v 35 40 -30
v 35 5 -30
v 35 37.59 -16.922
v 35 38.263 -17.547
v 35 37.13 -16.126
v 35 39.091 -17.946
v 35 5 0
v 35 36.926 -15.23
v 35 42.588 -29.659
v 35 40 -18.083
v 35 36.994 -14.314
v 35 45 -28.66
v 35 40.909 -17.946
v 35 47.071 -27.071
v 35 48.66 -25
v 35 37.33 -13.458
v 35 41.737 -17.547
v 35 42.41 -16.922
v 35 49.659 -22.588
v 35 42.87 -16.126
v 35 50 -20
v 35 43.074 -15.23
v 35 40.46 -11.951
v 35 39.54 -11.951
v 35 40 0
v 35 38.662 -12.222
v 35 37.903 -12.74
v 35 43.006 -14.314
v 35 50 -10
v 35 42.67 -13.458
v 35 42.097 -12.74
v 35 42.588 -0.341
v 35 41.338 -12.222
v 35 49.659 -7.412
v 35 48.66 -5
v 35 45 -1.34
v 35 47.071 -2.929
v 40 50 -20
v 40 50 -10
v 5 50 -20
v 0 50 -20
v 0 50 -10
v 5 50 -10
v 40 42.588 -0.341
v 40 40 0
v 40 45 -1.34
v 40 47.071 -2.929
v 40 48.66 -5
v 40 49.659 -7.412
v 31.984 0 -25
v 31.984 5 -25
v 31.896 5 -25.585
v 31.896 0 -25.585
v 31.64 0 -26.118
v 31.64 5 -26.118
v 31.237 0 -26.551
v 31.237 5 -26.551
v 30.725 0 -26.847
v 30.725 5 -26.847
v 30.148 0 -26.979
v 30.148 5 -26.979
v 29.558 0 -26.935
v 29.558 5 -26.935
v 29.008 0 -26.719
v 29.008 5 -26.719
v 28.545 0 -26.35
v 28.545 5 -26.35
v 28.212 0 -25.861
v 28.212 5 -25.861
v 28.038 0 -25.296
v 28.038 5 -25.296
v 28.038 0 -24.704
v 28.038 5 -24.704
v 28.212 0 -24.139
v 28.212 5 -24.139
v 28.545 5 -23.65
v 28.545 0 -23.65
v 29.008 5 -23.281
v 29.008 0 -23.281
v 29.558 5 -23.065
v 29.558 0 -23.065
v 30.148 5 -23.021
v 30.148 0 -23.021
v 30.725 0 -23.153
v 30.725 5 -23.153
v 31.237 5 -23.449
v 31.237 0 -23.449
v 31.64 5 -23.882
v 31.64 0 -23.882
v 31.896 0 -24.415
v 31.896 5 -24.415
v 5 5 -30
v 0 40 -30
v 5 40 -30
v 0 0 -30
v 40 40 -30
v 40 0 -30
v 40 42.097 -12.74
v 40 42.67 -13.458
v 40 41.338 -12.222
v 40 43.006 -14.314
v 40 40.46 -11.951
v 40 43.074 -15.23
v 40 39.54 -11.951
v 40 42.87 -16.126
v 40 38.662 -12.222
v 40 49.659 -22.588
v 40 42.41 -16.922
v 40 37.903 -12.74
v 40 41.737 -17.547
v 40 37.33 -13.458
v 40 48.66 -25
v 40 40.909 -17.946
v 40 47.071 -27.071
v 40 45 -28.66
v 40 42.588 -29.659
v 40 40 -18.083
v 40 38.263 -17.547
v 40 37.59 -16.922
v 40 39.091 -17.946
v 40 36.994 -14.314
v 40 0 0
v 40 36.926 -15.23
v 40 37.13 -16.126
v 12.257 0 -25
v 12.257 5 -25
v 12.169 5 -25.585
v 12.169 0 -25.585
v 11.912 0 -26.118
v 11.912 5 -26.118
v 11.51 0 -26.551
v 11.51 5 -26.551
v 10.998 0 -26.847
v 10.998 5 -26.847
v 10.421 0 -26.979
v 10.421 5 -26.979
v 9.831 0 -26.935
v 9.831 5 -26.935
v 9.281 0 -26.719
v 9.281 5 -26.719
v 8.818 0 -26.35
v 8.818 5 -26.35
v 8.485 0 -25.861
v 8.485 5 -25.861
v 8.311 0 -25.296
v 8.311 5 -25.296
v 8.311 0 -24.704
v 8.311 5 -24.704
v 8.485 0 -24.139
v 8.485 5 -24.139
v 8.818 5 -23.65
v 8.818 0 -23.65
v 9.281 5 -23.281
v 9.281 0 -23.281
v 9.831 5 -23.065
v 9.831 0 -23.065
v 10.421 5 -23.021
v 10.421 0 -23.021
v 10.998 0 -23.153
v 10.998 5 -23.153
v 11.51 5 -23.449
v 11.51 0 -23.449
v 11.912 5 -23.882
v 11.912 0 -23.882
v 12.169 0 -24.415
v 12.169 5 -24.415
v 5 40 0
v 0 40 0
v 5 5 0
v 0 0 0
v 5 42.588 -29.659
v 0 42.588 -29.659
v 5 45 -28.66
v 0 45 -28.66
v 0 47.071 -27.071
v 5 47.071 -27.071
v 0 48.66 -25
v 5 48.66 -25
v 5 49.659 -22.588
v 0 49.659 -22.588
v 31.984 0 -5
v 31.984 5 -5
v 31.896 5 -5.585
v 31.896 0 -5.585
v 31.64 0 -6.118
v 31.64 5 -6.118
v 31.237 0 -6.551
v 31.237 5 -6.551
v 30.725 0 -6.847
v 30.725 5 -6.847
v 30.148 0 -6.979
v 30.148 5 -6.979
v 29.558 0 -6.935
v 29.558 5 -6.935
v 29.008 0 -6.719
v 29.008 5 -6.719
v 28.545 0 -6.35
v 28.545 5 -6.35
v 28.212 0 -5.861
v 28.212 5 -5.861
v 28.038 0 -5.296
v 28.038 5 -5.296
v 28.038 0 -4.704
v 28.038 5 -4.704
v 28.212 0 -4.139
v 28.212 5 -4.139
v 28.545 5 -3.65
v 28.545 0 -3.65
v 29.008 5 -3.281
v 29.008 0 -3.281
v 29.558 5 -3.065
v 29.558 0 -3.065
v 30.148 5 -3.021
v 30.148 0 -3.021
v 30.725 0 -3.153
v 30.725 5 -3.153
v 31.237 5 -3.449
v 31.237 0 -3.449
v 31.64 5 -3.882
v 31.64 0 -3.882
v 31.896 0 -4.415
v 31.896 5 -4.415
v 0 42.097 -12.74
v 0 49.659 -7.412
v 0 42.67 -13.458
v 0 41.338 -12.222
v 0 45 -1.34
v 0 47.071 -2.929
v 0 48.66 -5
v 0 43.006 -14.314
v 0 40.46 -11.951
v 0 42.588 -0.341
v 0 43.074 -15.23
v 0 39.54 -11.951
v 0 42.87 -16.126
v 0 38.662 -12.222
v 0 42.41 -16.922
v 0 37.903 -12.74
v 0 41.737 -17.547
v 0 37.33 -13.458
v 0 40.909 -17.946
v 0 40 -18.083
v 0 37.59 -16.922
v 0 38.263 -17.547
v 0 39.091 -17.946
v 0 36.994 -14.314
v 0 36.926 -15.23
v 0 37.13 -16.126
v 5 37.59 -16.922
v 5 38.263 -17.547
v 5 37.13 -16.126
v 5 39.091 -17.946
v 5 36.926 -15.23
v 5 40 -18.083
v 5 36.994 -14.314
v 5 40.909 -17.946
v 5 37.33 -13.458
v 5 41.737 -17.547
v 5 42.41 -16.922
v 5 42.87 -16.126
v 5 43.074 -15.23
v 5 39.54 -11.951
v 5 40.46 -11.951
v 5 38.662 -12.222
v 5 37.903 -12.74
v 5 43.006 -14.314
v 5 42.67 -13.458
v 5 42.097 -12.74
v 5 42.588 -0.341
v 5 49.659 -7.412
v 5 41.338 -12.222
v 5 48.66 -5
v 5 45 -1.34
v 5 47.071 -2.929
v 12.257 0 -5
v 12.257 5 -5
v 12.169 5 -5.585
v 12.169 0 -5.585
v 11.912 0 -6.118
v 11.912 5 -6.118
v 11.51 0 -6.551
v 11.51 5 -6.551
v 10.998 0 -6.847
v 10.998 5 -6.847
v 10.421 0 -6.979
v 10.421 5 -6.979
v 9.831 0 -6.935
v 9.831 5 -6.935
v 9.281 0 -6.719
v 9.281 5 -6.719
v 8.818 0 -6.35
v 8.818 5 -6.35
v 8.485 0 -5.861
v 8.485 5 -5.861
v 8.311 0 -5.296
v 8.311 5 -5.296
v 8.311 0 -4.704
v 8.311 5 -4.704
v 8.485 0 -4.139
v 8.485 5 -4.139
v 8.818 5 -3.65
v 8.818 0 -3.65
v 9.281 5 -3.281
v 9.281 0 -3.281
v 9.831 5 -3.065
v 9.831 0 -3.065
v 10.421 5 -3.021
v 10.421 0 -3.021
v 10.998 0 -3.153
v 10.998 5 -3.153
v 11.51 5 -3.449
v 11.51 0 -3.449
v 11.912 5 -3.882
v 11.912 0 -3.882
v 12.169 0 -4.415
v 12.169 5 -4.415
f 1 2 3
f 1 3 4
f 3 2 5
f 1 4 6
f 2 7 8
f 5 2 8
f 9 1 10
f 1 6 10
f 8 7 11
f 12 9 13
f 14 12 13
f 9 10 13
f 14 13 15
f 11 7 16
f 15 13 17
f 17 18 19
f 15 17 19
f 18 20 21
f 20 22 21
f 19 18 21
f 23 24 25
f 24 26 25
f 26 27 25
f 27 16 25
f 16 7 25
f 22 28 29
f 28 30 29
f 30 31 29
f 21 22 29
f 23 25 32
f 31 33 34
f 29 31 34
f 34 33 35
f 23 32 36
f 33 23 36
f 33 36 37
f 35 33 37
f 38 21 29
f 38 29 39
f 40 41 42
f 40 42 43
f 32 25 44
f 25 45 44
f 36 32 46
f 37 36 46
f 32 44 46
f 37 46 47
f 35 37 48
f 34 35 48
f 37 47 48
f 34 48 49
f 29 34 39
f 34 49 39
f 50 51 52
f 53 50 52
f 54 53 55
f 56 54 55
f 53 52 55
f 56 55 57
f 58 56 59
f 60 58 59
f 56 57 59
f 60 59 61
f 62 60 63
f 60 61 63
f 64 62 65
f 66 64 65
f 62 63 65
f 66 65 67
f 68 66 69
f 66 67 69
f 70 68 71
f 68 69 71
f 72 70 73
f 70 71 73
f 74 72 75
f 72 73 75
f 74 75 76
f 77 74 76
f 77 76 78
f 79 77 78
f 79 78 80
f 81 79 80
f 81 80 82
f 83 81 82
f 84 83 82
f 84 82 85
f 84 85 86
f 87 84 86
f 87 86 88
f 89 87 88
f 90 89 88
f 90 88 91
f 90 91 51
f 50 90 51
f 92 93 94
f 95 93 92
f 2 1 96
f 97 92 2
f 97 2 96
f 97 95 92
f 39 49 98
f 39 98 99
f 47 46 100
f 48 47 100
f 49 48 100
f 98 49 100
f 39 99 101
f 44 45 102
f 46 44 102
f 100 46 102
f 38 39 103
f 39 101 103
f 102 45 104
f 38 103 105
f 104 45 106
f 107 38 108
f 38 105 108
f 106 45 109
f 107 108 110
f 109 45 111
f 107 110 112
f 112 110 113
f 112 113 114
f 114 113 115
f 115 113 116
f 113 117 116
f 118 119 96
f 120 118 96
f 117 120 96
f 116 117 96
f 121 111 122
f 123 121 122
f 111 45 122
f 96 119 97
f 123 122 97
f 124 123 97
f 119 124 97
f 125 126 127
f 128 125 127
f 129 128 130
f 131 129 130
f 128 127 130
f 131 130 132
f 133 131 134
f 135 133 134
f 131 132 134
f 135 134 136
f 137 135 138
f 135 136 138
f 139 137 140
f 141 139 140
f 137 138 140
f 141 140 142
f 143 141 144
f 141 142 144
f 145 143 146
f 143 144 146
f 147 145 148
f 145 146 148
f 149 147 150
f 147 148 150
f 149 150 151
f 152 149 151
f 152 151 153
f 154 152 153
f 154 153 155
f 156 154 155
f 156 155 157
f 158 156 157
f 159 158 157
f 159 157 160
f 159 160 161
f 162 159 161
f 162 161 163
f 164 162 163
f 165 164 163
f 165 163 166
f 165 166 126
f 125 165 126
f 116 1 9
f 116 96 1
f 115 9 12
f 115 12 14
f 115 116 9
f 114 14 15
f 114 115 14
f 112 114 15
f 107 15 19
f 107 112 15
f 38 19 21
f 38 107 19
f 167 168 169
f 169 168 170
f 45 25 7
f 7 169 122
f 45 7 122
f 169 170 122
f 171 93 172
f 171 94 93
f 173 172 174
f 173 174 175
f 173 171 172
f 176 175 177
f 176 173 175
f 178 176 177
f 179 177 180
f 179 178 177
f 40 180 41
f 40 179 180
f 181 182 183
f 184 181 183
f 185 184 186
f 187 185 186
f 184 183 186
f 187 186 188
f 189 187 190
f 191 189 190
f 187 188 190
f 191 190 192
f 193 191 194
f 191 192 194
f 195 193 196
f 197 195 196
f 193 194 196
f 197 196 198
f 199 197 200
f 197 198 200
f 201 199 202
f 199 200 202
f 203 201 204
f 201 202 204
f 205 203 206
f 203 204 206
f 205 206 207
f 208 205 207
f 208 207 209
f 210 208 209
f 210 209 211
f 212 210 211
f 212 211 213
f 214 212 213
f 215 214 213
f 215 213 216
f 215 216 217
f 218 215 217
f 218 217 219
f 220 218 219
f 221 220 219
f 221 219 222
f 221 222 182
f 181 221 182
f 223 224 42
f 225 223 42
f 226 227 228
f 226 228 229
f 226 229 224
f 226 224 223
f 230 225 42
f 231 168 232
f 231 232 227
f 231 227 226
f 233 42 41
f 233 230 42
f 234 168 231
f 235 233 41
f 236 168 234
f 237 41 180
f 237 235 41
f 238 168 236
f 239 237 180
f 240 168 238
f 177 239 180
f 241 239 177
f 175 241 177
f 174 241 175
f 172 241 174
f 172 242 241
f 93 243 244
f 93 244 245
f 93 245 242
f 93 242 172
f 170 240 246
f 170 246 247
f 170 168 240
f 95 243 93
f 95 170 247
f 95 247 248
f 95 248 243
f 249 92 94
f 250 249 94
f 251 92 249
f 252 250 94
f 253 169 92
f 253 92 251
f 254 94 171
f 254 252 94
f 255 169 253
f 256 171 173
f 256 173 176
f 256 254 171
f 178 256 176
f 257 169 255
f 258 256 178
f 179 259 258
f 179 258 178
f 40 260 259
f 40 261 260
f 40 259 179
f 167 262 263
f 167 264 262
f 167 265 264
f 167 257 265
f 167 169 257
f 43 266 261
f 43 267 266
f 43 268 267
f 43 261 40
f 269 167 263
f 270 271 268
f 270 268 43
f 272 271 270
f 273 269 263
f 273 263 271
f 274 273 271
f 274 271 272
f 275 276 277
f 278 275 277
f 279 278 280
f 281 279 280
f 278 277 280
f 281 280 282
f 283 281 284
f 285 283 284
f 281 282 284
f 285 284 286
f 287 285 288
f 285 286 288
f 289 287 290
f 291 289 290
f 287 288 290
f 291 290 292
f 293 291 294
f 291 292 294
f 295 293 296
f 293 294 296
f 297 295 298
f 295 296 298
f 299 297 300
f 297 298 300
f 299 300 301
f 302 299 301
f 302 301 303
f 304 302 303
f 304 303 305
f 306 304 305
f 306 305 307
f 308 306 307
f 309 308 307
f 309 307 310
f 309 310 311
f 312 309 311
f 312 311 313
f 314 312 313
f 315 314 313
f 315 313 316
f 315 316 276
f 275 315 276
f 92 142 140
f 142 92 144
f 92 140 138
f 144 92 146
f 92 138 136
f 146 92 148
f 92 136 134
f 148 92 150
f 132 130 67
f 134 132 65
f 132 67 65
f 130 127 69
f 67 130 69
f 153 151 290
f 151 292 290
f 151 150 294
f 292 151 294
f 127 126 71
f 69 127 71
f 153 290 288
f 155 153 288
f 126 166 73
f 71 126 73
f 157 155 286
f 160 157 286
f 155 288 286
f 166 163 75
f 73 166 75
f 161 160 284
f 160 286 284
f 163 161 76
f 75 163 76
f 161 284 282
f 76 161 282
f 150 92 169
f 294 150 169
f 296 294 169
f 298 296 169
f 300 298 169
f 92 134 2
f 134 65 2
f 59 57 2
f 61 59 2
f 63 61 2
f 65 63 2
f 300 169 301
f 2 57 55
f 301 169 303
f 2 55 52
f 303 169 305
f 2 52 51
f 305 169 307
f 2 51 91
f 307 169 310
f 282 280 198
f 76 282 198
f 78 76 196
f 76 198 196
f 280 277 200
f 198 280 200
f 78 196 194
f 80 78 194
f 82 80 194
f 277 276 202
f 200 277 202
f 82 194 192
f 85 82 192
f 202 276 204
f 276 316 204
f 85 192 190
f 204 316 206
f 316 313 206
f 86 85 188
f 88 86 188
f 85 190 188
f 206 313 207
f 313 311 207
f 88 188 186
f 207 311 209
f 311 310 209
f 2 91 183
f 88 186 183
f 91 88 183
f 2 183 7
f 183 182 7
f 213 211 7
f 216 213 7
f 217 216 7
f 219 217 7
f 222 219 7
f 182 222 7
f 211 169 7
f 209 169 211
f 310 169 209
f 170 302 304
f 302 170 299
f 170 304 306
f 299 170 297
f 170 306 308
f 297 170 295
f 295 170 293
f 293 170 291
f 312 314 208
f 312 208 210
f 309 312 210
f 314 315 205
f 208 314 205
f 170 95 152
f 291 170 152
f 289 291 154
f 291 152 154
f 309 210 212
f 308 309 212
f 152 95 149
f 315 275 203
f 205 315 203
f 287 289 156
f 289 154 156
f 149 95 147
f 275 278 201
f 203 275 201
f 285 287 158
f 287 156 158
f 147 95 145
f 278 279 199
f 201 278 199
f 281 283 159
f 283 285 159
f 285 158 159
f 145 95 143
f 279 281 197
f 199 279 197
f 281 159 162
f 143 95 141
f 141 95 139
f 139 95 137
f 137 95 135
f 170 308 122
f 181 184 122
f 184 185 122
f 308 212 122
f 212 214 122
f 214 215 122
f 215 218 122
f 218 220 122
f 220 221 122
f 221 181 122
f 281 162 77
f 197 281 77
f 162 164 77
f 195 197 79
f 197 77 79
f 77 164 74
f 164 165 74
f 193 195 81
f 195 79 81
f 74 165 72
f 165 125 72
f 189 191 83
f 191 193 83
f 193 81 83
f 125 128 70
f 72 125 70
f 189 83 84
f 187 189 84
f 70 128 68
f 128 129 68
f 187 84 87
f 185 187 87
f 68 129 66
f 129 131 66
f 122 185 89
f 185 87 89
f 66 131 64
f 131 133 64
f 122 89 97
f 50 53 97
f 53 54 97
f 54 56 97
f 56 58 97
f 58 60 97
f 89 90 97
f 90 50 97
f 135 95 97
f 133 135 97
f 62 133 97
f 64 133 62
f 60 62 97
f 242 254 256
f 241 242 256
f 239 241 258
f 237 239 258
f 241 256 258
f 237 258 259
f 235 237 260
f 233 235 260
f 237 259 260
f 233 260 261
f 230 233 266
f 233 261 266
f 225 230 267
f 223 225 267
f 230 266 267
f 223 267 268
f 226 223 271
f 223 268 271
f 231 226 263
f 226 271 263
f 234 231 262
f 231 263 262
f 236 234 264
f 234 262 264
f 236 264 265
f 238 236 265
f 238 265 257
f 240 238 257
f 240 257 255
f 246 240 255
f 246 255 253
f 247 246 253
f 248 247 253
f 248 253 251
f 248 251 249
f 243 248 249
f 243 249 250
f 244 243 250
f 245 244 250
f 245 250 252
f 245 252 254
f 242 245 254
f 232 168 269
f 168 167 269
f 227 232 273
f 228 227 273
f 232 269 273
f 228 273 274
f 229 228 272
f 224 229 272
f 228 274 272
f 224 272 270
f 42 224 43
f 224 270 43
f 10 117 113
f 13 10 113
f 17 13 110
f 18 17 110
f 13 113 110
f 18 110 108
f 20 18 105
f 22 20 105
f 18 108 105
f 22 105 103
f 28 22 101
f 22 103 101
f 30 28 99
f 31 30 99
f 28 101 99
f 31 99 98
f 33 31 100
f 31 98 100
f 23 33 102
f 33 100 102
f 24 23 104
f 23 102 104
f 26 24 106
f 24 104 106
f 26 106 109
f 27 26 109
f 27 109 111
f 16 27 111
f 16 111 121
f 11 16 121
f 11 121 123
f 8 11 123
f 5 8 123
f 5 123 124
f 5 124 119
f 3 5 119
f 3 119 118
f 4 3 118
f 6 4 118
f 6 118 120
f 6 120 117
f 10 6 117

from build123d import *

# Parameters (mm, degrees)
SKETCH1_W           = 40
SKETCH1_H           = 30
BOSS_EXTRUDE1_DEPTH = 50
SKETCH2_W           = 30
SKETCH2_H           = 45
CUT_EXTRUDE1_DEPTH  = 30
FILLET1_R           = 10
SKETCH3_R           = 1.984375
CUT_EXTRUDE2_DEPTH  = 30
SKETCH4_R           = 3.083104926
CUT_EXTRUDE3_DEPTH  = 55
SKETCH5_R           = 1.984375
CUT_EXTRUDE4_DEPTH  = 30


with BuildPart() as part:
    # Sketch1 → Boss-Extrude1 (new body)
    with BuildSketch(Plane(origin=(0, 0, 0), x_dir=(1, 0, 0), z_dir=(0, 1, 0))):
        with Locations((20, 15)):
            Rectangle(SKETCH1_W, SKETCH1_H)
    extrude(amount=BOSS_EXTRUDE1_DEPTH)

    # Sketch2 → Cut-Extrude1 (cut)
    with BuildSketch(Plane.XY):
        with Locations((20, 27.5)):
            Rectangle(SKETCH2_W, SKETCH2_H)
    extrude(amount=-CUT_EXTRUDE1_DEPTH, mode=Mode.SUBTRACT)

    # Fillet1
    fillet1_edges = [part.edges().sort_by_distance(p)[0] for p in [
        (37.5, 50, -30),
        (37.5, 50, 0),
        (2.5, 50, -30),
        (2.5, 50, 0),
    ]]
    fillet(fillet1_edges, radius=FILLET1_R)

    # Sketch3 → Cut-Extrude2 (cut)
    with BuildSketch(Plane(origin=(0, 5, 0), x_dir=(1, 0, 0), z_dir=(0, 1, 0))):
        with Locations((10.272803798, 5)):
            Circle(SKETCH3_R)
        with Locations((10.272803798, 25)):
            Circle(SKETCH3_R)
    extrude(amount=-CUT_EXTRUDE2_DEPTH, mode=Mode.SUBTRACT)

    # Sketch4 → Cut-Extrude3 (cut)
    with BuildSketch(Plane(origin=(40, 0, 0), x_dir=(0, 0, -1), z_dir=(1, 0, 0))):
        with Locations((15, 40)):
            Circle(SKETCH4_R)
    extrude(amount=-CUT_EXTRUDE3_DEPTH, mode=Mode.SUBTRACT)

    # Sketch5 → Cut-Extrude4 (cut)
    with BuildSketch(Plane(origin=(0, 5, 0), x_dir=(1, 0, 0), z_dir=(0, 1, 0))):
        with Locations((30, 25)):
            Circle(SKETCH5_R)
        with Locations((30, 5)):
            Circle(SKETCH5_R)
    extrude(amount=-CUT_EXTRUDE4_DEPTH, mode=Mode.SUBTRACT)


solid = part.part
